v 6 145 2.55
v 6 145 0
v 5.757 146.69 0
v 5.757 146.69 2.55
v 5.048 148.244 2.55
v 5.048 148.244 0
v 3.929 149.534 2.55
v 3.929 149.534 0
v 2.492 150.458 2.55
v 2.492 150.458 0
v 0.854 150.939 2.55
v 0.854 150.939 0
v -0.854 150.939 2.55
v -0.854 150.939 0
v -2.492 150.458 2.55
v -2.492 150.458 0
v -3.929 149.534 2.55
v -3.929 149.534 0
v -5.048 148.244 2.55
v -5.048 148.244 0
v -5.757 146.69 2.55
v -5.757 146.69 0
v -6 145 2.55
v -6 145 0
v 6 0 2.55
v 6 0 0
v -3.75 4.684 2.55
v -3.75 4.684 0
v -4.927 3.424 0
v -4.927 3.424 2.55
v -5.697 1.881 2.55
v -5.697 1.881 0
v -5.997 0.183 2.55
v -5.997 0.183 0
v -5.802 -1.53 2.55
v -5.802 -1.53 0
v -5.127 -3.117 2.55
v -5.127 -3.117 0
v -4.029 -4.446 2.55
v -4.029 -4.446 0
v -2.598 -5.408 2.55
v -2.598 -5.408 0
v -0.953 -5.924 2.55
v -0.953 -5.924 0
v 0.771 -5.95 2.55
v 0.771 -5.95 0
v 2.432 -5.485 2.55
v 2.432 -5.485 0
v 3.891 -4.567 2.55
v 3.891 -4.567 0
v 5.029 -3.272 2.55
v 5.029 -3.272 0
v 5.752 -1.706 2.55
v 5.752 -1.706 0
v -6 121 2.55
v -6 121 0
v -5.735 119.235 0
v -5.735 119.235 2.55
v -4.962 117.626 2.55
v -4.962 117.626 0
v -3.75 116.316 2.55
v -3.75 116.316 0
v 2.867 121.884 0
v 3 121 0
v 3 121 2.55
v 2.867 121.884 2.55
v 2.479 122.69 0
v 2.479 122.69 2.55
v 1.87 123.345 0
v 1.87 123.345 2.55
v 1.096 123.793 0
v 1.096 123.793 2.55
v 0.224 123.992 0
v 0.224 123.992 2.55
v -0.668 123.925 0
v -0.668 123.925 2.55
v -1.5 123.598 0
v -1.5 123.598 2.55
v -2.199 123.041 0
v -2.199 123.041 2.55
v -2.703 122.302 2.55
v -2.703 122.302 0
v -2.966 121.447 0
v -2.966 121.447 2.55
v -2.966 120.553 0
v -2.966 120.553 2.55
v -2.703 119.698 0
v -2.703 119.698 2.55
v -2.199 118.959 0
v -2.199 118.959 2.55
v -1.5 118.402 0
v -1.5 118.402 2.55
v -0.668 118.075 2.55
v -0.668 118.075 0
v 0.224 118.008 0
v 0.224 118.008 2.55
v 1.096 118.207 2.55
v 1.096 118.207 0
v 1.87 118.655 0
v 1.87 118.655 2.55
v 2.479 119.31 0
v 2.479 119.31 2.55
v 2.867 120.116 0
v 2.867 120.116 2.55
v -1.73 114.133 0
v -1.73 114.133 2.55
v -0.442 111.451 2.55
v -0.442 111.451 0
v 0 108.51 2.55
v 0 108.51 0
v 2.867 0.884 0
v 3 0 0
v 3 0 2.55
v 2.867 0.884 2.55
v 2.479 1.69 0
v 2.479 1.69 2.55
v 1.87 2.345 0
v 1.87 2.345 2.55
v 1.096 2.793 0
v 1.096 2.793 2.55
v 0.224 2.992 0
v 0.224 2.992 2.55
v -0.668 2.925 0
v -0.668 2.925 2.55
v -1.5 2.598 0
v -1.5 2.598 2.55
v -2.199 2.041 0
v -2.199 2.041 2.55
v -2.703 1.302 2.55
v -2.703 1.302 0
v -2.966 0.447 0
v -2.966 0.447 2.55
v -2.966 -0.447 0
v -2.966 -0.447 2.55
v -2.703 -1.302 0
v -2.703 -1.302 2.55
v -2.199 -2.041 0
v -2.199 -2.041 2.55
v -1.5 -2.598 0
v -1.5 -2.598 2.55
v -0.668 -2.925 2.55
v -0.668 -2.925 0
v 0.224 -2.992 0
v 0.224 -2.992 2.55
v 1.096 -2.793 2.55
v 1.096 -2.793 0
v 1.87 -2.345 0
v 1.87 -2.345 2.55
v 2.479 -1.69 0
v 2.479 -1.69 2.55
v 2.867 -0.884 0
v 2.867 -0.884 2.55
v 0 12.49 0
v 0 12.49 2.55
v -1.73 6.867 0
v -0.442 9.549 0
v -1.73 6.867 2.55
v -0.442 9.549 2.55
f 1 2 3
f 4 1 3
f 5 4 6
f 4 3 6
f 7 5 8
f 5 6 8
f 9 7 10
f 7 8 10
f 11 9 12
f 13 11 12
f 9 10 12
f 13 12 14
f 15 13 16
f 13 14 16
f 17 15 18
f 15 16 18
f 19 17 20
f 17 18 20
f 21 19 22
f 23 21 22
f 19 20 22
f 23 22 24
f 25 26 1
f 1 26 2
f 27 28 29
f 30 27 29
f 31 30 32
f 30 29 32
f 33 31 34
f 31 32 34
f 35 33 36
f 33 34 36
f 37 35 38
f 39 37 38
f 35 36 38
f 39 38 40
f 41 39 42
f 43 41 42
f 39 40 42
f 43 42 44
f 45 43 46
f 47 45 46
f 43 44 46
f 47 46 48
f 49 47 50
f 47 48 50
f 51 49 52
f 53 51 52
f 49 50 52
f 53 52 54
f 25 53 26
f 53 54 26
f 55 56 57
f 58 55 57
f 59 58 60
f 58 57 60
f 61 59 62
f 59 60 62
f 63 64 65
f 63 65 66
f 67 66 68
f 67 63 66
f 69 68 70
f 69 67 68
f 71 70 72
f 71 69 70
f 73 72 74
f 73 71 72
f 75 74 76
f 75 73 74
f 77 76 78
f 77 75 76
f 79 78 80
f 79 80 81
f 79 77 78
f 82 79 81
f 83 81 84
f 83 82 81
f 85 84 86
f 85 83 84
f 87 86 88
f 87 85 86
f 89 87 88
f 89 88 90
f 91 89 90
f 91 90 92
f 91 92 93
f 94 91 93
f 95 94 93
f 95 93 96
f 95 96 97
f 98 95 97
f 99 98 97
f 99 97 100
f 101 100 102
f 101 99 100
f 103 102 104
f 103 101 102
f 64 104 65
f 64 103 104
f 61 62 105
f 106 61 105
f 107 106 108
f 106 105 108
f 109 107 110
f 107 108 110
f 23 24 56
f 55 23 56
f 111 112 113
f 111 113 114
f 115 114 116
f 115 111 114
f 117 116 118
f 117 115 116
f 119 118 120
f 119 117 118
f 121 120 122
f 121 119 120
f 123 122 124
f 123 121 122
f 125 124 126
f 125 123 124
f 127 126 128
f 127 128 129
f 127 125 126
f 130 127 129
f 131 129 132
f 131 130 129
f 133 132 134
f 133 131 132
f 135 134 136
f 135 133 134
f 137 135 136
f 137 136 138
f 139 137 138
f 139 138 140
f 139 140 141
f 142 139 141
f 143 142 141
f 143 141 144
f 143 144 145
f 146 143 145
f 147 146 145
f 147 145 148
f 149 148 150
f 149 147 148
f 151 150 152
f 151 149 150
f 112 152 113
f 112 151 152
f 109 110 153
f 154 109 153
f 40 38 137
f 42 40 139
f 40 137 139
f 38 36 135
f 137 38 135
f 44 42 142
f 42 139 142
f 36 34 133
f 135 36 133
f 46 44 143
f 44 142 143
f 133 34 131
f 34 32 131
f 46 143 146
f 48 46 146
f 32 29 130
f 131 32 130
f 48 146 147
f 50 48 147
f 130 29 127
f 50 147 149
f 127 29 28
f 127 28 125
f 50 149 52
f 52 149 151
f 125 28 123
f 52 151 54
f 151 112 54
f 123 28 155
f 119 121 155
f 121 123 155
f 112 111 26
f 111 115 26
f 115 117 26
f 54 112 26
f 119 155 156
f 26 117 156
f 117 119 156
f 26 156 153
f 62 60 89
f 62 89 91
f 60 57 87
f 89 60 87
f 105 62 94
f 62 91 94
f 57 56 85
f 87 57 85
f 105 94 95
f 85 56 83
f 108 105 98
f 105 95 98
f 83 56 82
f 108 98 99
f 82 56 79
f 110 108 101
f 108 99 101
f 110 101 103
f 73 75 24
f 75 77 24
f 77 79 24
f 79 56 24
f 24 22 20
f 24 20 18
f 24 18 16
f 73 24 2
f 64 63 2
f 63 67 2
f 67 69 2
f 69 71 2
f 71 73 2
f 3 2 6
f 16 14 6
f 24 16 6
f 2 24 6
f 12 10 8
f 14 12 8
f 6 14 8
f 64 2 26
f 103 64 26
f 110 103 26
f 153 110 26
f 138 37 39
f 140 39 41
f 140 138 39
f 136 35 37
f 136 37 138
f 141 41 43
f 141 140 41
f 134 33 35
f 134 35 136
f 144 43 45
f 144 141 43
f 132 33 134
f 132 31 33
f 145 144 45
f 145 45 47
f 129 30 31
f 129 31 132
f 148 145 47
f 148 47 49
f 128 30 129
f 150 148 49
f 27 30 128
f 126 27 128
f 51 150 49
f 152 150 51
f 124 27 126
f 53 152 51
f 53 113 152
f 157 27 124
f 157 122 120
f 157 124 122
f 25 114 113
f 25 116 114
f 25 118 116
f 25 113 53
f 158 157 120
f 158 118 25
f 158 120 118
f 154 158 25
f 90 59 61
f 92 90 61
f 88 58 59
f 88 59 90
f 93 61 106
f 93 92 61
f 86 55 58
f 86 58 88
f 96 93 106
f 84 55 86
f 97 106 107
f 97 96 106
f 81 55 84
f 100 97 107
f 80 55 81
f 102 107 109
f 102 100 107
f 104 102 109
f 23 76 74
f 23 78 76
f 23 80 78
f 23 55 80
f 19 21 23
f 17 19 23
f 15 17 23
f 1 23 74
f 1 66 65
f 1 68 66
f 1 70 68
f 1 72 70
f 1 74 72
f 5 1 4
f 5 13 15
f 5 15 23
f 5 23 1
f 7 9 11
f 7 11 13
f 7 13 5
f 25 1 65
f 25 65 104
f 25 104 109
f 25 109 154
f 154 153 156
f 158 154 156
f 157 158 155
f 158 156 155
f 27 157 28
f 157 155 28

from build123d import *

# Parameters (mm, degrees)
MODEL_R             = 3
BOSS_EXTRUDE1_DEPTH = 2.55


with BuildPart() as part:
    # Model → Boss-Extrude1 (new body)
    with BuildSketch(Plane.XY):
        with BuildLine():
            Line((6, 120), (6, 145))
            ThreePointArc((6, 145), (0, 151), (-6, 145))
            Line((-6, 145), (-6, 121))
            ThreePointArc((-6, 121), (-5.408326913, 118.401923789), (-3.75, 116.316251501))
            ThreePointArc((-3.75, 116.316251501), (-0.986121811, 112.840131022), (0, 108.510004003))
            Line((0, 108.510004003), (0, 12.489995997))
            ThreePointArc((0, 12.489995997), (-0.986121811, 8.159868978), (-3.75, 4.683748499))
            ThreePointArc((-3.75, 4.683748499), (-2.598076211, -5.408326913), (6, 0))
            Line((6, 0), (6, 120))
        make_face()
        Circle(MODEL_R, mode=Mode.SUBTRACT)
        with Locations((0, 121)):
            Circle(MODEL_R, mode=Mode.SUBTRACT)
    extrude(amount=BOSS_EXTRUDE1_DEPTH)


solid = part.part
